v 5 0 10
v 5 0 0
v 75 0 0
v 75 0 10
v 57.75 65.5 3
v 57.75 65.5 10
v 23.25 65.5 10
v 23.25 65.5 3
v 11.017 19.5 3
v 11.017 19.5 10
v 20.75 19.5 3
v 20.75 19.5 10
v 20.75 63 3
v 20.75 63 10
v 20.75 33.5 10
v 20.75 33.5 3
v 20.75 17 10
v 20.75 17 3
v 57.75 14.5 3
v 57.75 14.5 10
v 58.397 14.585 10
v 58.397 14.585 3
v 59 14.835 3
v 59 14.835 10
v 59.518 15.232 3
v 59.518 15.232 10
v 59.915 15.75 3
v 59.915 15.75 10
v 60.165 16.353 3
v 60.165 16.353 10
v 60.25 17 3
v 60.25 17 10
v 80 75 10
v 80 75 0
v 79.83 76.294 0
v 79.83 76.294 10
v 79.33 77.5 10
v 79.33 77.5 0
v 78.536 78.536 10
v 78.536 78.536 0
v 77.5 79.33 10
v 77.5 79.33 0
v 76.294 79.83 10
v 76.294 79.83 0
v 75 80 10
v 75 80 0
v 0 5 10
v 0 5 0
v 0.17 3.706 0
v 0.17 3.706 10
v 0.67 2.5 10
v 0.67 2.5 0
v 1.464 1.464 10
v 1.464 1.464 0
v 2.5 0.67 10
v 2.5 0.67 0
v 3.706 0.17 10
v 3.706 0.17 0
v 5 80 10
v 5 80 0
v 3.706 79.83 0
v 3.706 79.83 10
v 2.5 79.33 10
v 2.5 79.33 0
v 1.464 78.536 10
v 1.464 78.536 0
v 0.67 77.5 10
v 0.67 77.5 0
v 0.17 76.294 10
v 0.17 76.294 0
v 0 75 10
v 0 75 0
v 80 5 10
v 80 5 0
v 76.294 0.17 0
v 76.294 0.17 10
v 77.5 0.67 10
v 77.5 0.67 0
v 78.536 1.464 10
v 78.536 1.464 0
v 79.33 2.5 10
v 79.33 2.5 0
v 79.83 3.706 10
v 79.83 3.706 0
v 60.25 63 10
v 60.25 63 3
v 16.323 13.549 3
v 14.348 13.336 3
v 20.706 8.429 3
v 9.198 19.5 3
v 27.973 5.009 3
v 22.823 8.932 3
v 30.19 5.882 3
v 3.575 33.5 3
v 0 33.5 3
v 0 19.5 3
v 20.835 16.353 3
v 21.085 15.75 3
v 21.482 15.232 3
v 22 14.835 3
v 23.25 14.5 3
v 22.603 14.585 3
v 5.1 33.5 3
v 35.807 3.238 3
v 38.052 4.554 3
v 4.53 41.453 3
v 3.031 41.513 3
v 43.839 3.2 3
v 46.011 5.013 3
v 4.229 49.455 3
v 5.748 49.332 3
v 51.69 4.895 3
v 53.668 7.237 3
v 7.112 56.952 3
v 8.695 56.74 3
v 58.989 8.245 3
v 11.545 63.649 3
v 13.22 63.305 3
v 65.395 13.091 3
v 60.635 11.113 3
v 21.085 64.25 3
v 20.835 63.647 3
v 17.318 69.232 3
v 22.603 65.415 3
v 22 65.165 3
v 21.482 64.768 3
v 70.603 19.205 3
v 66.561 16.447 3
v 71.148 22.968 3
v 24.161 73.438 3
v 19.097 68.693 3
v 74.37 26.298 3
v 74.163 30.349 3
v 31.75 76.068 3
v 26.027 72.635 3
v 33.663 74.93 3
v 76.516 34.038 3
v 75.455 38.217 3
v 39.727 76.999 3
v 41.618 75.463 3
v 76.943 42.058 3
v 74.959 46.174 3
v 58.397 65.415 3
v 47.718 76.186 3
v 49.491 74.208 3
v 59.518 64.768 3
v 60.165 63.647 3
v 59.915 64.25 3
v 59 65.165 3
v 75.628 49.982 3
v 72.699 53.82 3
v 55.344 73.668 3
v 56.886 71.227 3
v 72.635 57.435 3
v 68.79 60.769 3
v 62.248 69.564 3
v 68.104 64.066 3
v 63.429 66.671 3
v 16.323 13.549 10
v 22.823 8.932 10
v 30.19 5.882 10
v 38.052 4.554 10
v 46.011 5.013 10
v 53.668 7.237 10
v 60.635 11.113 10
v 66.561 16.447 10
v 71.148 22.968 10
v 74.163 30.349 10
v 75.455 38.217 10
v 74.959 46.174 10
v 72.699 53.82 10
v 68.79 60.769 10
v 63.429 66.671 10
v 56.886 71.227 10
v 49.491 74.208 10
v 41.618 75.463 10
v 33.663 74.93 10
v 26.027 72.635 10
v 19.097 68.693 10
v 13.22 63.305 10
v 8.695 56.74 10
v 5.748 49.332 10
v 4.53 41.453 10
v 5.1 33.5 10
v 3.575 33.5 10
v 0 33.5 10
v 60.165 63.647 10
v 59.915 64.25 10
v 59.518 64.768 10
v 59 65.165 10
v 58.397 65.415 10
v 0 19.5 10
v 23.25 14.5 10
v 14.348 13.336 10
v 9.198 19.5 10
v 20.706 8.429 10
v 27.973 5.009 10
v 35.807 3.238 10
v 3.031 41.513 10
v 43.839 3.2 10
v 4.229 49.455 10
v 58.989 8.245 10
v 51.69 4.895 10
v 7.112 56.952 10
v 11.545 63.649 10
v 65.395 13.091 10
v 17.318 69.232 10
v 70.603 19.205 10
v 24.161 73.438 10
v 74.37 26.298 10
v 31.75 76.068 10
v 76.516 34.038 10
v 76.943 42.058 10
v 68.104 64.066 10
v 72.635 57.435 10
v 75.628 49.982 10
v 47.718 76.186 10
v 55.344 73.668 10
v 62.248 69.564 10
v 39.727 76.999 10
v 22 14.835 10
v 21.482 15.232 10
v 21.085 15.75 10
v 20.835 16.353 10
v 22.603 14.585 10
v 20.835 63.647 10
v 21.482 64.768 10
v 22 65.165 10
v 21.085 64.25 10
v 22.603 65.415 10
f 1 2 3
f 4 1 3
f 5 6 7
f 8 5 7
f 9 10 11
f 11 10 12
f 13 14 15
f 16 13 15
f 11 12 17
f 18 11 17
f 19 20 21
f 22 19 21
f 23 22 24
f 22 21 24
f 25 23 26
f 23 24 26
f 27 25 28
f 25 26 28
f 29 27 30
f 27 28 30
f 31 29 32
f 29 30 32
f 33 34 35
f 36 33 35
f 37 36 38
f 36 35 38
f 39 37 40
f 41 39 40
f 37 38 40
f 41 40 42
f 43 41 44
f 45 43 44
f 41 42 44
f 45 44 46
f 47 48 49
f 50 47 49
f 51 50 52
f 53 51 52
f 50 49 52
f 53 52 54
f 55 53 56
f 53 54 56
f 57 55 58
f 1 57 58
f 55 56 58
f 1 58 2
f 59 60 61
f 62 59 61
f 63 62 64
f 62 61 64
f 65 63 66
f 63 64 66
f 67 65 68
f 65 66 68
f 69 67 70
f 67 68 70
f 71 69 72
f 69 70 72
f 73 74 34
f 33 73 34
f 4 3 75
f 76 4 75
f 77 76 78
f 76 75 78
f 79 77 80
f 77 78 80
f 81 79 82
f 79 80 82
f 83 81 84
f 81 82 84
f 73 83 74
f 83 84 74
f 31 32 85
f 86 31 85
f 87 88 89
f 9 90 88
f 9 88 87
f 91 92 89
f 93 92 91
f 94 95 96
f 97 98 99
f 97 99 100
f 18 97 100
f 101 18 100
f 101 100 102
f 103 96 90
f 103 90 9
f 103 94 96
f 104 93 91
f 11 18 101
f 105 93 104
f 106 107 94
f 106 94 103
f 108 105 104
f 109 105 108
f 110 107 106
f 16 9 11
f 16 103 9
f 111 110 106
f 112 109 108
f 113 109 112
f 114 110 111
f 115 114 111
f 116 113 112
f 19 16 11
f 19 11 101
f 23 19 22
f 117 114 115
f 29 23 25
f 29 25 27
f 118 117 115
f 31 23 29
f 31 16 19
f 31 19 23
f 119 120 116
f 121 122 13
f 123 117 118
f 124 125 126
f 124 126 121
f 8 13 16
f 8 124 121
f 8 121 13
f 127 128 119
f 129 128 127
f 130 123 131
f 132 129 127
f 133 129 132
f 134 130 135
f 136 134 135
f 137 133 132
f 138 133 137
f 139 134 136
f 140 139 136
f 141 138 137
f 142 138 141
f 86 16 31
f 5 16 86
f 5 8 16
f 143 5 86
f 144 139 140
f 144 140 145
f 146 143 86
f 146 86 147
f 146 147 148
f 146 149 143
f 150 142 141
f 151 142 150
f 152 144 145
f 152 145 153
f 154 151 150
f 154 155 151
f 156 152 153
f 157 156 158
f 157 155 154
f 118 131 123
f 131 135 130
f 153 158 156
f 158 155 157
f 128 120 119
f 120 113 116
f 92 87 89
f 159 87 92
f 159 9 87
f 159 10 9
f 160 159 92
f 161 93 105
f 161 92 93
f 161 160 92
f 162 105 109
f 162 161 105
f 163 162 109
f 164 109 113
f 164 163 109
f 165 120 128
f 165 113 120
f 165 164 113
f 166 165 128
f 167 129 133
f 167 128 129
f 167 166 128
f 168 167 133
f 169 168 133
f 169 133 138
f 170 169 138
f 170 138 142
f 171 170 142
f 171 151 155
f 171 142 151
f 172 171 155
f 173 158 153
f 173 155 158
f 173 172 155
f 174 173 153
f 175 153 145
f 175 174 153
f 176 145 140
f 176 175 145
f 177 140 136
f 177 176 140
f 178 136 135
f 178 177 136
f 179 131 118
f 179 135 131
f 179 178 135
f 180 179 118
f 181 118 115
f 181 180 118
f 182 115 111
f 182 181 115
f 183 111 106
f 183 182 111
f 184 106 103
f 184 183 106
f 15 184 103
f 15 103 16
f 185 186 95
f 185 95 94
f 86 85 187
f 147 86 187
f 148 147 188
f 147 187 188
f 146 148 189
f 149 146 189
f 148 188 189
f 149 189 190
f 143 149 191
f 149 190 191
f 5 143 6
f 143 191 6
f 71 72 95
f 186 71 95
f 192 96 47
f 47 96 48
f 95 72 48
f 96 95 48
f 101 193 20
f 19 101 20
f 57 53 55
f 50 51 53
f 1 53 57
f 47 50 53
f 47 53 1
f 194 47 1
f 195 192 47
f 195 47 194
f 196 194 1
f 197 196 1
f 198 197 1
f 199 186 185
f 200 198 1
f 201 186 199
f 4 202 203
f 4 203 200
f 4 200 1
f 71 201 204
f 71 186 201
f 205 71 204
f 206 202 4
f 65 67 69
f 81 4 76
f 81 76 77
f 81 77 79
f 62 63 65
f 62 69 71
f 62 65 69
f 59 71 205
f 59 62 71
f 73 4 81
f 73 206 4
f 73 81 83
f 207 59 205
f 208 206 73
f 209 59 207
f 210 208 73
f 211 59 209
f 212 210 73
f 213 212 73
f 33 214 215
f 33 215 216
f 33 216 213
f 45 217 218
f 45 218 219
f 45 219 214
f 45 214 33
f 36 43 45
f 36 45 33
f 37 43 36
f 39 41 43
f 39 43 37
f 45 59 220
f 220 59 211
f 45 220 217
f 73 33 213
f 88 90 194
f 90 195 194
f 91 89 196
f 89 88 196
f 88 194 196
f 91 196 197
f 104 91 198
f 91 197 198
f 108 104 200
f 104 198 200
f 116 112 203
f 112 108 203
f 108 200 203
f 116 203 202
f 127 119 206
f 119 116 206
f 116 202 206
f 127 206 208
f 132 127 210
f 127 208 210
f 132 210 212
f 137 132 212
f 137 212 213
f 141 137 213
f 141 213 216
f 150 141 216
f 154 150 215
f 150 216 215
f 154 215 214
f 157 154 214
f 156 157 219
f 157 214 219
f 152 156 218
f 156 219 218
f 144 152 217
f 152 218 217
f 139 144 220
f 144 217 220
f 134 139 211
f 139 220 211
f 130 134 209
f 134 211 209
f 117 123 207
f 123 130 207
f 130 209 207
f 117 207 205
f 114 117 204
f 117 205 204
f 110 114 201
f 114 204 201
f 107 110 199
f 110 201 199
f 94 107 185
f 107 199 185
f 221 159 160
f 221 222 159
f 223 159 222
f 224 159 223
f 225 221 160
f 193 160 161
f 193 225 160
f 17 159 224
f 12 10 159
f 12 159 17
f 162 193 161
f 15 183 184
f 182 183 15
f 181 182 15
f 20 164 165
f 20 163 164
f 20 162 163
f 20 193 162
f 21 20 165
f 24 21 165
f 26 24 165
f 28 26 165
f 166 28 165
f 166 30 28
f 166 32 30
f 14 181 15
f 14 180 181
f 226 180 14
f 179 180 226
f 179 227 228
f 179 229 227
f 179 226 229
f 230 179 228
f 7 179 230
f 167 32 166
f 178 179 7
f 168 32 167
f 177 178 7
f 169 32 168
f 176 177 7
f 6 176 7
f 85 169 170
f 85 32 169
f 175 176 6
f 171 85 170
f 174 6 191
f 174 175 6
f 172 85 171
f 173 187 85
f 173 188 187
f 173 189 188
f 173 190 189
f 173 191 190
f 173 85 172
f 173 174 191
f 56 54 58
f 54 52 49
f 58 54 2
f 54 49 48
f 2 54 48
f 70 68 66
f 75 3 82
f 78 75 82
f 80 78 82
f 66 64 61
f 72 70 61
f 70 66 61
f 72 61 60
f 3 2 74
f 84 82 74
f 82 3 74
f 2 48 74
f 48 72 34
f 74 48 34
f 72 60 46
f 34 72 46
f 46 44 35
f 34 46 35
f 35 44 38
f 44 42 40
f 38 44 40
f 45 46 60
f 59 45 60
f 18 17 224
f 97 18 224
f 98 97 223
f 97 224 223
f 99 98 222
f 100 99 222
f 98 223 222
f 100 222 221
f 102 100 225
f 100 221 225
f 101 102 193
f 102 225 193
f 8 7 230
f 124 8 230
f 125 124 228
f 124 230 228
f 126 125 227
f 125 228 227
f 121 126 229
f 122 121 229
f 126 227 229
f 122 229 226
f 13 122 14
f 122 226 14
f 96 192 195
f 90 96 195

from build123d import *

# Parameters (mm, degrees)
F1_DEPTH = 10
F3_DEPTH = 7
F4_R     = 37
F4_R_2   = 35.5
F5_DEPTH = 7
F6_W     = 20.75
F6_H     = 14
F7_DEPTH = 7


with BuildPart() as f1:
    # F0 (on Top) → F1 (new body)
    with BuildSketch(Plane.XY):
        with BuildLine():
            Line((75, 80), (5, 80))
            ThreePointArc((5, 80), (1.464466, 78.535534), (0, 75))
            Line((0, 75), (0, 5))
            ThreePointArc((0, 5), (1.464466, 1.464466), (5, 0))
            Line((5, 0), (75, 0))
            ThreePointArc((75, 0), (78.535534, 1.464466), (80, 5))
            Line((80, 5), (80, 75))
            ThreePointArc((80, 75), (78.535534, 78.535534), (75, 80))
        make_face()
    extrude(amount=F1_DEPTH)

    # F2 (on face) → F3 (cut)
    with BuildSketch(Plane.XY.offset(10)):
        with BuildLine():
            ThreePointArc((20.75, 17), (21.482233, 15.232233), (23.25, 14.5))
            Line((23.25, 14.5), (57.75, 14.5))
            ThreePointArc((57.75, 14.5), (59.517767, 15.232233), (60.25, 17))
            Line((60.25, 17), (60.25, 63))
            ThreePointArc((60.25, 63), (59.517767, 64.767767), (57.75, 65.5))
            Line((57.75, 65.5), (23.25, 65.5))
            ThreePointArc((23.25, 65.5), (21.482233, 64.767767), (20.75, 63))
            Line((20.75, 63), (20.75, 17))
        make_face()
    extrude(amount=-F3_DEPTH, mode=Mode.SUBTRACT)

    # F4 (on face) → F5 (cut)
    with BuildSketch(Plane.XY.offset(10)):
        with Locations((40, 40)):
            Circle(F4_R)
        with Locations((40, 40)):
            Circle(F4_R_2, mode=Mode.SUBTRACT)
    extrude(amount=-F5_DEPTH, mode=Mode.SUBTRACT)

    # F6 (on face) → F7 (cut)
    with BuildSketch(Plane.XY.offset(10)):
        with Locations((10.375, 26.5)):
            Rectangle(F6_W, F6_H)
    extrude(amount=-F7_DEPTH, mode=Mode.SUBTRACT)


solid = f1.part
